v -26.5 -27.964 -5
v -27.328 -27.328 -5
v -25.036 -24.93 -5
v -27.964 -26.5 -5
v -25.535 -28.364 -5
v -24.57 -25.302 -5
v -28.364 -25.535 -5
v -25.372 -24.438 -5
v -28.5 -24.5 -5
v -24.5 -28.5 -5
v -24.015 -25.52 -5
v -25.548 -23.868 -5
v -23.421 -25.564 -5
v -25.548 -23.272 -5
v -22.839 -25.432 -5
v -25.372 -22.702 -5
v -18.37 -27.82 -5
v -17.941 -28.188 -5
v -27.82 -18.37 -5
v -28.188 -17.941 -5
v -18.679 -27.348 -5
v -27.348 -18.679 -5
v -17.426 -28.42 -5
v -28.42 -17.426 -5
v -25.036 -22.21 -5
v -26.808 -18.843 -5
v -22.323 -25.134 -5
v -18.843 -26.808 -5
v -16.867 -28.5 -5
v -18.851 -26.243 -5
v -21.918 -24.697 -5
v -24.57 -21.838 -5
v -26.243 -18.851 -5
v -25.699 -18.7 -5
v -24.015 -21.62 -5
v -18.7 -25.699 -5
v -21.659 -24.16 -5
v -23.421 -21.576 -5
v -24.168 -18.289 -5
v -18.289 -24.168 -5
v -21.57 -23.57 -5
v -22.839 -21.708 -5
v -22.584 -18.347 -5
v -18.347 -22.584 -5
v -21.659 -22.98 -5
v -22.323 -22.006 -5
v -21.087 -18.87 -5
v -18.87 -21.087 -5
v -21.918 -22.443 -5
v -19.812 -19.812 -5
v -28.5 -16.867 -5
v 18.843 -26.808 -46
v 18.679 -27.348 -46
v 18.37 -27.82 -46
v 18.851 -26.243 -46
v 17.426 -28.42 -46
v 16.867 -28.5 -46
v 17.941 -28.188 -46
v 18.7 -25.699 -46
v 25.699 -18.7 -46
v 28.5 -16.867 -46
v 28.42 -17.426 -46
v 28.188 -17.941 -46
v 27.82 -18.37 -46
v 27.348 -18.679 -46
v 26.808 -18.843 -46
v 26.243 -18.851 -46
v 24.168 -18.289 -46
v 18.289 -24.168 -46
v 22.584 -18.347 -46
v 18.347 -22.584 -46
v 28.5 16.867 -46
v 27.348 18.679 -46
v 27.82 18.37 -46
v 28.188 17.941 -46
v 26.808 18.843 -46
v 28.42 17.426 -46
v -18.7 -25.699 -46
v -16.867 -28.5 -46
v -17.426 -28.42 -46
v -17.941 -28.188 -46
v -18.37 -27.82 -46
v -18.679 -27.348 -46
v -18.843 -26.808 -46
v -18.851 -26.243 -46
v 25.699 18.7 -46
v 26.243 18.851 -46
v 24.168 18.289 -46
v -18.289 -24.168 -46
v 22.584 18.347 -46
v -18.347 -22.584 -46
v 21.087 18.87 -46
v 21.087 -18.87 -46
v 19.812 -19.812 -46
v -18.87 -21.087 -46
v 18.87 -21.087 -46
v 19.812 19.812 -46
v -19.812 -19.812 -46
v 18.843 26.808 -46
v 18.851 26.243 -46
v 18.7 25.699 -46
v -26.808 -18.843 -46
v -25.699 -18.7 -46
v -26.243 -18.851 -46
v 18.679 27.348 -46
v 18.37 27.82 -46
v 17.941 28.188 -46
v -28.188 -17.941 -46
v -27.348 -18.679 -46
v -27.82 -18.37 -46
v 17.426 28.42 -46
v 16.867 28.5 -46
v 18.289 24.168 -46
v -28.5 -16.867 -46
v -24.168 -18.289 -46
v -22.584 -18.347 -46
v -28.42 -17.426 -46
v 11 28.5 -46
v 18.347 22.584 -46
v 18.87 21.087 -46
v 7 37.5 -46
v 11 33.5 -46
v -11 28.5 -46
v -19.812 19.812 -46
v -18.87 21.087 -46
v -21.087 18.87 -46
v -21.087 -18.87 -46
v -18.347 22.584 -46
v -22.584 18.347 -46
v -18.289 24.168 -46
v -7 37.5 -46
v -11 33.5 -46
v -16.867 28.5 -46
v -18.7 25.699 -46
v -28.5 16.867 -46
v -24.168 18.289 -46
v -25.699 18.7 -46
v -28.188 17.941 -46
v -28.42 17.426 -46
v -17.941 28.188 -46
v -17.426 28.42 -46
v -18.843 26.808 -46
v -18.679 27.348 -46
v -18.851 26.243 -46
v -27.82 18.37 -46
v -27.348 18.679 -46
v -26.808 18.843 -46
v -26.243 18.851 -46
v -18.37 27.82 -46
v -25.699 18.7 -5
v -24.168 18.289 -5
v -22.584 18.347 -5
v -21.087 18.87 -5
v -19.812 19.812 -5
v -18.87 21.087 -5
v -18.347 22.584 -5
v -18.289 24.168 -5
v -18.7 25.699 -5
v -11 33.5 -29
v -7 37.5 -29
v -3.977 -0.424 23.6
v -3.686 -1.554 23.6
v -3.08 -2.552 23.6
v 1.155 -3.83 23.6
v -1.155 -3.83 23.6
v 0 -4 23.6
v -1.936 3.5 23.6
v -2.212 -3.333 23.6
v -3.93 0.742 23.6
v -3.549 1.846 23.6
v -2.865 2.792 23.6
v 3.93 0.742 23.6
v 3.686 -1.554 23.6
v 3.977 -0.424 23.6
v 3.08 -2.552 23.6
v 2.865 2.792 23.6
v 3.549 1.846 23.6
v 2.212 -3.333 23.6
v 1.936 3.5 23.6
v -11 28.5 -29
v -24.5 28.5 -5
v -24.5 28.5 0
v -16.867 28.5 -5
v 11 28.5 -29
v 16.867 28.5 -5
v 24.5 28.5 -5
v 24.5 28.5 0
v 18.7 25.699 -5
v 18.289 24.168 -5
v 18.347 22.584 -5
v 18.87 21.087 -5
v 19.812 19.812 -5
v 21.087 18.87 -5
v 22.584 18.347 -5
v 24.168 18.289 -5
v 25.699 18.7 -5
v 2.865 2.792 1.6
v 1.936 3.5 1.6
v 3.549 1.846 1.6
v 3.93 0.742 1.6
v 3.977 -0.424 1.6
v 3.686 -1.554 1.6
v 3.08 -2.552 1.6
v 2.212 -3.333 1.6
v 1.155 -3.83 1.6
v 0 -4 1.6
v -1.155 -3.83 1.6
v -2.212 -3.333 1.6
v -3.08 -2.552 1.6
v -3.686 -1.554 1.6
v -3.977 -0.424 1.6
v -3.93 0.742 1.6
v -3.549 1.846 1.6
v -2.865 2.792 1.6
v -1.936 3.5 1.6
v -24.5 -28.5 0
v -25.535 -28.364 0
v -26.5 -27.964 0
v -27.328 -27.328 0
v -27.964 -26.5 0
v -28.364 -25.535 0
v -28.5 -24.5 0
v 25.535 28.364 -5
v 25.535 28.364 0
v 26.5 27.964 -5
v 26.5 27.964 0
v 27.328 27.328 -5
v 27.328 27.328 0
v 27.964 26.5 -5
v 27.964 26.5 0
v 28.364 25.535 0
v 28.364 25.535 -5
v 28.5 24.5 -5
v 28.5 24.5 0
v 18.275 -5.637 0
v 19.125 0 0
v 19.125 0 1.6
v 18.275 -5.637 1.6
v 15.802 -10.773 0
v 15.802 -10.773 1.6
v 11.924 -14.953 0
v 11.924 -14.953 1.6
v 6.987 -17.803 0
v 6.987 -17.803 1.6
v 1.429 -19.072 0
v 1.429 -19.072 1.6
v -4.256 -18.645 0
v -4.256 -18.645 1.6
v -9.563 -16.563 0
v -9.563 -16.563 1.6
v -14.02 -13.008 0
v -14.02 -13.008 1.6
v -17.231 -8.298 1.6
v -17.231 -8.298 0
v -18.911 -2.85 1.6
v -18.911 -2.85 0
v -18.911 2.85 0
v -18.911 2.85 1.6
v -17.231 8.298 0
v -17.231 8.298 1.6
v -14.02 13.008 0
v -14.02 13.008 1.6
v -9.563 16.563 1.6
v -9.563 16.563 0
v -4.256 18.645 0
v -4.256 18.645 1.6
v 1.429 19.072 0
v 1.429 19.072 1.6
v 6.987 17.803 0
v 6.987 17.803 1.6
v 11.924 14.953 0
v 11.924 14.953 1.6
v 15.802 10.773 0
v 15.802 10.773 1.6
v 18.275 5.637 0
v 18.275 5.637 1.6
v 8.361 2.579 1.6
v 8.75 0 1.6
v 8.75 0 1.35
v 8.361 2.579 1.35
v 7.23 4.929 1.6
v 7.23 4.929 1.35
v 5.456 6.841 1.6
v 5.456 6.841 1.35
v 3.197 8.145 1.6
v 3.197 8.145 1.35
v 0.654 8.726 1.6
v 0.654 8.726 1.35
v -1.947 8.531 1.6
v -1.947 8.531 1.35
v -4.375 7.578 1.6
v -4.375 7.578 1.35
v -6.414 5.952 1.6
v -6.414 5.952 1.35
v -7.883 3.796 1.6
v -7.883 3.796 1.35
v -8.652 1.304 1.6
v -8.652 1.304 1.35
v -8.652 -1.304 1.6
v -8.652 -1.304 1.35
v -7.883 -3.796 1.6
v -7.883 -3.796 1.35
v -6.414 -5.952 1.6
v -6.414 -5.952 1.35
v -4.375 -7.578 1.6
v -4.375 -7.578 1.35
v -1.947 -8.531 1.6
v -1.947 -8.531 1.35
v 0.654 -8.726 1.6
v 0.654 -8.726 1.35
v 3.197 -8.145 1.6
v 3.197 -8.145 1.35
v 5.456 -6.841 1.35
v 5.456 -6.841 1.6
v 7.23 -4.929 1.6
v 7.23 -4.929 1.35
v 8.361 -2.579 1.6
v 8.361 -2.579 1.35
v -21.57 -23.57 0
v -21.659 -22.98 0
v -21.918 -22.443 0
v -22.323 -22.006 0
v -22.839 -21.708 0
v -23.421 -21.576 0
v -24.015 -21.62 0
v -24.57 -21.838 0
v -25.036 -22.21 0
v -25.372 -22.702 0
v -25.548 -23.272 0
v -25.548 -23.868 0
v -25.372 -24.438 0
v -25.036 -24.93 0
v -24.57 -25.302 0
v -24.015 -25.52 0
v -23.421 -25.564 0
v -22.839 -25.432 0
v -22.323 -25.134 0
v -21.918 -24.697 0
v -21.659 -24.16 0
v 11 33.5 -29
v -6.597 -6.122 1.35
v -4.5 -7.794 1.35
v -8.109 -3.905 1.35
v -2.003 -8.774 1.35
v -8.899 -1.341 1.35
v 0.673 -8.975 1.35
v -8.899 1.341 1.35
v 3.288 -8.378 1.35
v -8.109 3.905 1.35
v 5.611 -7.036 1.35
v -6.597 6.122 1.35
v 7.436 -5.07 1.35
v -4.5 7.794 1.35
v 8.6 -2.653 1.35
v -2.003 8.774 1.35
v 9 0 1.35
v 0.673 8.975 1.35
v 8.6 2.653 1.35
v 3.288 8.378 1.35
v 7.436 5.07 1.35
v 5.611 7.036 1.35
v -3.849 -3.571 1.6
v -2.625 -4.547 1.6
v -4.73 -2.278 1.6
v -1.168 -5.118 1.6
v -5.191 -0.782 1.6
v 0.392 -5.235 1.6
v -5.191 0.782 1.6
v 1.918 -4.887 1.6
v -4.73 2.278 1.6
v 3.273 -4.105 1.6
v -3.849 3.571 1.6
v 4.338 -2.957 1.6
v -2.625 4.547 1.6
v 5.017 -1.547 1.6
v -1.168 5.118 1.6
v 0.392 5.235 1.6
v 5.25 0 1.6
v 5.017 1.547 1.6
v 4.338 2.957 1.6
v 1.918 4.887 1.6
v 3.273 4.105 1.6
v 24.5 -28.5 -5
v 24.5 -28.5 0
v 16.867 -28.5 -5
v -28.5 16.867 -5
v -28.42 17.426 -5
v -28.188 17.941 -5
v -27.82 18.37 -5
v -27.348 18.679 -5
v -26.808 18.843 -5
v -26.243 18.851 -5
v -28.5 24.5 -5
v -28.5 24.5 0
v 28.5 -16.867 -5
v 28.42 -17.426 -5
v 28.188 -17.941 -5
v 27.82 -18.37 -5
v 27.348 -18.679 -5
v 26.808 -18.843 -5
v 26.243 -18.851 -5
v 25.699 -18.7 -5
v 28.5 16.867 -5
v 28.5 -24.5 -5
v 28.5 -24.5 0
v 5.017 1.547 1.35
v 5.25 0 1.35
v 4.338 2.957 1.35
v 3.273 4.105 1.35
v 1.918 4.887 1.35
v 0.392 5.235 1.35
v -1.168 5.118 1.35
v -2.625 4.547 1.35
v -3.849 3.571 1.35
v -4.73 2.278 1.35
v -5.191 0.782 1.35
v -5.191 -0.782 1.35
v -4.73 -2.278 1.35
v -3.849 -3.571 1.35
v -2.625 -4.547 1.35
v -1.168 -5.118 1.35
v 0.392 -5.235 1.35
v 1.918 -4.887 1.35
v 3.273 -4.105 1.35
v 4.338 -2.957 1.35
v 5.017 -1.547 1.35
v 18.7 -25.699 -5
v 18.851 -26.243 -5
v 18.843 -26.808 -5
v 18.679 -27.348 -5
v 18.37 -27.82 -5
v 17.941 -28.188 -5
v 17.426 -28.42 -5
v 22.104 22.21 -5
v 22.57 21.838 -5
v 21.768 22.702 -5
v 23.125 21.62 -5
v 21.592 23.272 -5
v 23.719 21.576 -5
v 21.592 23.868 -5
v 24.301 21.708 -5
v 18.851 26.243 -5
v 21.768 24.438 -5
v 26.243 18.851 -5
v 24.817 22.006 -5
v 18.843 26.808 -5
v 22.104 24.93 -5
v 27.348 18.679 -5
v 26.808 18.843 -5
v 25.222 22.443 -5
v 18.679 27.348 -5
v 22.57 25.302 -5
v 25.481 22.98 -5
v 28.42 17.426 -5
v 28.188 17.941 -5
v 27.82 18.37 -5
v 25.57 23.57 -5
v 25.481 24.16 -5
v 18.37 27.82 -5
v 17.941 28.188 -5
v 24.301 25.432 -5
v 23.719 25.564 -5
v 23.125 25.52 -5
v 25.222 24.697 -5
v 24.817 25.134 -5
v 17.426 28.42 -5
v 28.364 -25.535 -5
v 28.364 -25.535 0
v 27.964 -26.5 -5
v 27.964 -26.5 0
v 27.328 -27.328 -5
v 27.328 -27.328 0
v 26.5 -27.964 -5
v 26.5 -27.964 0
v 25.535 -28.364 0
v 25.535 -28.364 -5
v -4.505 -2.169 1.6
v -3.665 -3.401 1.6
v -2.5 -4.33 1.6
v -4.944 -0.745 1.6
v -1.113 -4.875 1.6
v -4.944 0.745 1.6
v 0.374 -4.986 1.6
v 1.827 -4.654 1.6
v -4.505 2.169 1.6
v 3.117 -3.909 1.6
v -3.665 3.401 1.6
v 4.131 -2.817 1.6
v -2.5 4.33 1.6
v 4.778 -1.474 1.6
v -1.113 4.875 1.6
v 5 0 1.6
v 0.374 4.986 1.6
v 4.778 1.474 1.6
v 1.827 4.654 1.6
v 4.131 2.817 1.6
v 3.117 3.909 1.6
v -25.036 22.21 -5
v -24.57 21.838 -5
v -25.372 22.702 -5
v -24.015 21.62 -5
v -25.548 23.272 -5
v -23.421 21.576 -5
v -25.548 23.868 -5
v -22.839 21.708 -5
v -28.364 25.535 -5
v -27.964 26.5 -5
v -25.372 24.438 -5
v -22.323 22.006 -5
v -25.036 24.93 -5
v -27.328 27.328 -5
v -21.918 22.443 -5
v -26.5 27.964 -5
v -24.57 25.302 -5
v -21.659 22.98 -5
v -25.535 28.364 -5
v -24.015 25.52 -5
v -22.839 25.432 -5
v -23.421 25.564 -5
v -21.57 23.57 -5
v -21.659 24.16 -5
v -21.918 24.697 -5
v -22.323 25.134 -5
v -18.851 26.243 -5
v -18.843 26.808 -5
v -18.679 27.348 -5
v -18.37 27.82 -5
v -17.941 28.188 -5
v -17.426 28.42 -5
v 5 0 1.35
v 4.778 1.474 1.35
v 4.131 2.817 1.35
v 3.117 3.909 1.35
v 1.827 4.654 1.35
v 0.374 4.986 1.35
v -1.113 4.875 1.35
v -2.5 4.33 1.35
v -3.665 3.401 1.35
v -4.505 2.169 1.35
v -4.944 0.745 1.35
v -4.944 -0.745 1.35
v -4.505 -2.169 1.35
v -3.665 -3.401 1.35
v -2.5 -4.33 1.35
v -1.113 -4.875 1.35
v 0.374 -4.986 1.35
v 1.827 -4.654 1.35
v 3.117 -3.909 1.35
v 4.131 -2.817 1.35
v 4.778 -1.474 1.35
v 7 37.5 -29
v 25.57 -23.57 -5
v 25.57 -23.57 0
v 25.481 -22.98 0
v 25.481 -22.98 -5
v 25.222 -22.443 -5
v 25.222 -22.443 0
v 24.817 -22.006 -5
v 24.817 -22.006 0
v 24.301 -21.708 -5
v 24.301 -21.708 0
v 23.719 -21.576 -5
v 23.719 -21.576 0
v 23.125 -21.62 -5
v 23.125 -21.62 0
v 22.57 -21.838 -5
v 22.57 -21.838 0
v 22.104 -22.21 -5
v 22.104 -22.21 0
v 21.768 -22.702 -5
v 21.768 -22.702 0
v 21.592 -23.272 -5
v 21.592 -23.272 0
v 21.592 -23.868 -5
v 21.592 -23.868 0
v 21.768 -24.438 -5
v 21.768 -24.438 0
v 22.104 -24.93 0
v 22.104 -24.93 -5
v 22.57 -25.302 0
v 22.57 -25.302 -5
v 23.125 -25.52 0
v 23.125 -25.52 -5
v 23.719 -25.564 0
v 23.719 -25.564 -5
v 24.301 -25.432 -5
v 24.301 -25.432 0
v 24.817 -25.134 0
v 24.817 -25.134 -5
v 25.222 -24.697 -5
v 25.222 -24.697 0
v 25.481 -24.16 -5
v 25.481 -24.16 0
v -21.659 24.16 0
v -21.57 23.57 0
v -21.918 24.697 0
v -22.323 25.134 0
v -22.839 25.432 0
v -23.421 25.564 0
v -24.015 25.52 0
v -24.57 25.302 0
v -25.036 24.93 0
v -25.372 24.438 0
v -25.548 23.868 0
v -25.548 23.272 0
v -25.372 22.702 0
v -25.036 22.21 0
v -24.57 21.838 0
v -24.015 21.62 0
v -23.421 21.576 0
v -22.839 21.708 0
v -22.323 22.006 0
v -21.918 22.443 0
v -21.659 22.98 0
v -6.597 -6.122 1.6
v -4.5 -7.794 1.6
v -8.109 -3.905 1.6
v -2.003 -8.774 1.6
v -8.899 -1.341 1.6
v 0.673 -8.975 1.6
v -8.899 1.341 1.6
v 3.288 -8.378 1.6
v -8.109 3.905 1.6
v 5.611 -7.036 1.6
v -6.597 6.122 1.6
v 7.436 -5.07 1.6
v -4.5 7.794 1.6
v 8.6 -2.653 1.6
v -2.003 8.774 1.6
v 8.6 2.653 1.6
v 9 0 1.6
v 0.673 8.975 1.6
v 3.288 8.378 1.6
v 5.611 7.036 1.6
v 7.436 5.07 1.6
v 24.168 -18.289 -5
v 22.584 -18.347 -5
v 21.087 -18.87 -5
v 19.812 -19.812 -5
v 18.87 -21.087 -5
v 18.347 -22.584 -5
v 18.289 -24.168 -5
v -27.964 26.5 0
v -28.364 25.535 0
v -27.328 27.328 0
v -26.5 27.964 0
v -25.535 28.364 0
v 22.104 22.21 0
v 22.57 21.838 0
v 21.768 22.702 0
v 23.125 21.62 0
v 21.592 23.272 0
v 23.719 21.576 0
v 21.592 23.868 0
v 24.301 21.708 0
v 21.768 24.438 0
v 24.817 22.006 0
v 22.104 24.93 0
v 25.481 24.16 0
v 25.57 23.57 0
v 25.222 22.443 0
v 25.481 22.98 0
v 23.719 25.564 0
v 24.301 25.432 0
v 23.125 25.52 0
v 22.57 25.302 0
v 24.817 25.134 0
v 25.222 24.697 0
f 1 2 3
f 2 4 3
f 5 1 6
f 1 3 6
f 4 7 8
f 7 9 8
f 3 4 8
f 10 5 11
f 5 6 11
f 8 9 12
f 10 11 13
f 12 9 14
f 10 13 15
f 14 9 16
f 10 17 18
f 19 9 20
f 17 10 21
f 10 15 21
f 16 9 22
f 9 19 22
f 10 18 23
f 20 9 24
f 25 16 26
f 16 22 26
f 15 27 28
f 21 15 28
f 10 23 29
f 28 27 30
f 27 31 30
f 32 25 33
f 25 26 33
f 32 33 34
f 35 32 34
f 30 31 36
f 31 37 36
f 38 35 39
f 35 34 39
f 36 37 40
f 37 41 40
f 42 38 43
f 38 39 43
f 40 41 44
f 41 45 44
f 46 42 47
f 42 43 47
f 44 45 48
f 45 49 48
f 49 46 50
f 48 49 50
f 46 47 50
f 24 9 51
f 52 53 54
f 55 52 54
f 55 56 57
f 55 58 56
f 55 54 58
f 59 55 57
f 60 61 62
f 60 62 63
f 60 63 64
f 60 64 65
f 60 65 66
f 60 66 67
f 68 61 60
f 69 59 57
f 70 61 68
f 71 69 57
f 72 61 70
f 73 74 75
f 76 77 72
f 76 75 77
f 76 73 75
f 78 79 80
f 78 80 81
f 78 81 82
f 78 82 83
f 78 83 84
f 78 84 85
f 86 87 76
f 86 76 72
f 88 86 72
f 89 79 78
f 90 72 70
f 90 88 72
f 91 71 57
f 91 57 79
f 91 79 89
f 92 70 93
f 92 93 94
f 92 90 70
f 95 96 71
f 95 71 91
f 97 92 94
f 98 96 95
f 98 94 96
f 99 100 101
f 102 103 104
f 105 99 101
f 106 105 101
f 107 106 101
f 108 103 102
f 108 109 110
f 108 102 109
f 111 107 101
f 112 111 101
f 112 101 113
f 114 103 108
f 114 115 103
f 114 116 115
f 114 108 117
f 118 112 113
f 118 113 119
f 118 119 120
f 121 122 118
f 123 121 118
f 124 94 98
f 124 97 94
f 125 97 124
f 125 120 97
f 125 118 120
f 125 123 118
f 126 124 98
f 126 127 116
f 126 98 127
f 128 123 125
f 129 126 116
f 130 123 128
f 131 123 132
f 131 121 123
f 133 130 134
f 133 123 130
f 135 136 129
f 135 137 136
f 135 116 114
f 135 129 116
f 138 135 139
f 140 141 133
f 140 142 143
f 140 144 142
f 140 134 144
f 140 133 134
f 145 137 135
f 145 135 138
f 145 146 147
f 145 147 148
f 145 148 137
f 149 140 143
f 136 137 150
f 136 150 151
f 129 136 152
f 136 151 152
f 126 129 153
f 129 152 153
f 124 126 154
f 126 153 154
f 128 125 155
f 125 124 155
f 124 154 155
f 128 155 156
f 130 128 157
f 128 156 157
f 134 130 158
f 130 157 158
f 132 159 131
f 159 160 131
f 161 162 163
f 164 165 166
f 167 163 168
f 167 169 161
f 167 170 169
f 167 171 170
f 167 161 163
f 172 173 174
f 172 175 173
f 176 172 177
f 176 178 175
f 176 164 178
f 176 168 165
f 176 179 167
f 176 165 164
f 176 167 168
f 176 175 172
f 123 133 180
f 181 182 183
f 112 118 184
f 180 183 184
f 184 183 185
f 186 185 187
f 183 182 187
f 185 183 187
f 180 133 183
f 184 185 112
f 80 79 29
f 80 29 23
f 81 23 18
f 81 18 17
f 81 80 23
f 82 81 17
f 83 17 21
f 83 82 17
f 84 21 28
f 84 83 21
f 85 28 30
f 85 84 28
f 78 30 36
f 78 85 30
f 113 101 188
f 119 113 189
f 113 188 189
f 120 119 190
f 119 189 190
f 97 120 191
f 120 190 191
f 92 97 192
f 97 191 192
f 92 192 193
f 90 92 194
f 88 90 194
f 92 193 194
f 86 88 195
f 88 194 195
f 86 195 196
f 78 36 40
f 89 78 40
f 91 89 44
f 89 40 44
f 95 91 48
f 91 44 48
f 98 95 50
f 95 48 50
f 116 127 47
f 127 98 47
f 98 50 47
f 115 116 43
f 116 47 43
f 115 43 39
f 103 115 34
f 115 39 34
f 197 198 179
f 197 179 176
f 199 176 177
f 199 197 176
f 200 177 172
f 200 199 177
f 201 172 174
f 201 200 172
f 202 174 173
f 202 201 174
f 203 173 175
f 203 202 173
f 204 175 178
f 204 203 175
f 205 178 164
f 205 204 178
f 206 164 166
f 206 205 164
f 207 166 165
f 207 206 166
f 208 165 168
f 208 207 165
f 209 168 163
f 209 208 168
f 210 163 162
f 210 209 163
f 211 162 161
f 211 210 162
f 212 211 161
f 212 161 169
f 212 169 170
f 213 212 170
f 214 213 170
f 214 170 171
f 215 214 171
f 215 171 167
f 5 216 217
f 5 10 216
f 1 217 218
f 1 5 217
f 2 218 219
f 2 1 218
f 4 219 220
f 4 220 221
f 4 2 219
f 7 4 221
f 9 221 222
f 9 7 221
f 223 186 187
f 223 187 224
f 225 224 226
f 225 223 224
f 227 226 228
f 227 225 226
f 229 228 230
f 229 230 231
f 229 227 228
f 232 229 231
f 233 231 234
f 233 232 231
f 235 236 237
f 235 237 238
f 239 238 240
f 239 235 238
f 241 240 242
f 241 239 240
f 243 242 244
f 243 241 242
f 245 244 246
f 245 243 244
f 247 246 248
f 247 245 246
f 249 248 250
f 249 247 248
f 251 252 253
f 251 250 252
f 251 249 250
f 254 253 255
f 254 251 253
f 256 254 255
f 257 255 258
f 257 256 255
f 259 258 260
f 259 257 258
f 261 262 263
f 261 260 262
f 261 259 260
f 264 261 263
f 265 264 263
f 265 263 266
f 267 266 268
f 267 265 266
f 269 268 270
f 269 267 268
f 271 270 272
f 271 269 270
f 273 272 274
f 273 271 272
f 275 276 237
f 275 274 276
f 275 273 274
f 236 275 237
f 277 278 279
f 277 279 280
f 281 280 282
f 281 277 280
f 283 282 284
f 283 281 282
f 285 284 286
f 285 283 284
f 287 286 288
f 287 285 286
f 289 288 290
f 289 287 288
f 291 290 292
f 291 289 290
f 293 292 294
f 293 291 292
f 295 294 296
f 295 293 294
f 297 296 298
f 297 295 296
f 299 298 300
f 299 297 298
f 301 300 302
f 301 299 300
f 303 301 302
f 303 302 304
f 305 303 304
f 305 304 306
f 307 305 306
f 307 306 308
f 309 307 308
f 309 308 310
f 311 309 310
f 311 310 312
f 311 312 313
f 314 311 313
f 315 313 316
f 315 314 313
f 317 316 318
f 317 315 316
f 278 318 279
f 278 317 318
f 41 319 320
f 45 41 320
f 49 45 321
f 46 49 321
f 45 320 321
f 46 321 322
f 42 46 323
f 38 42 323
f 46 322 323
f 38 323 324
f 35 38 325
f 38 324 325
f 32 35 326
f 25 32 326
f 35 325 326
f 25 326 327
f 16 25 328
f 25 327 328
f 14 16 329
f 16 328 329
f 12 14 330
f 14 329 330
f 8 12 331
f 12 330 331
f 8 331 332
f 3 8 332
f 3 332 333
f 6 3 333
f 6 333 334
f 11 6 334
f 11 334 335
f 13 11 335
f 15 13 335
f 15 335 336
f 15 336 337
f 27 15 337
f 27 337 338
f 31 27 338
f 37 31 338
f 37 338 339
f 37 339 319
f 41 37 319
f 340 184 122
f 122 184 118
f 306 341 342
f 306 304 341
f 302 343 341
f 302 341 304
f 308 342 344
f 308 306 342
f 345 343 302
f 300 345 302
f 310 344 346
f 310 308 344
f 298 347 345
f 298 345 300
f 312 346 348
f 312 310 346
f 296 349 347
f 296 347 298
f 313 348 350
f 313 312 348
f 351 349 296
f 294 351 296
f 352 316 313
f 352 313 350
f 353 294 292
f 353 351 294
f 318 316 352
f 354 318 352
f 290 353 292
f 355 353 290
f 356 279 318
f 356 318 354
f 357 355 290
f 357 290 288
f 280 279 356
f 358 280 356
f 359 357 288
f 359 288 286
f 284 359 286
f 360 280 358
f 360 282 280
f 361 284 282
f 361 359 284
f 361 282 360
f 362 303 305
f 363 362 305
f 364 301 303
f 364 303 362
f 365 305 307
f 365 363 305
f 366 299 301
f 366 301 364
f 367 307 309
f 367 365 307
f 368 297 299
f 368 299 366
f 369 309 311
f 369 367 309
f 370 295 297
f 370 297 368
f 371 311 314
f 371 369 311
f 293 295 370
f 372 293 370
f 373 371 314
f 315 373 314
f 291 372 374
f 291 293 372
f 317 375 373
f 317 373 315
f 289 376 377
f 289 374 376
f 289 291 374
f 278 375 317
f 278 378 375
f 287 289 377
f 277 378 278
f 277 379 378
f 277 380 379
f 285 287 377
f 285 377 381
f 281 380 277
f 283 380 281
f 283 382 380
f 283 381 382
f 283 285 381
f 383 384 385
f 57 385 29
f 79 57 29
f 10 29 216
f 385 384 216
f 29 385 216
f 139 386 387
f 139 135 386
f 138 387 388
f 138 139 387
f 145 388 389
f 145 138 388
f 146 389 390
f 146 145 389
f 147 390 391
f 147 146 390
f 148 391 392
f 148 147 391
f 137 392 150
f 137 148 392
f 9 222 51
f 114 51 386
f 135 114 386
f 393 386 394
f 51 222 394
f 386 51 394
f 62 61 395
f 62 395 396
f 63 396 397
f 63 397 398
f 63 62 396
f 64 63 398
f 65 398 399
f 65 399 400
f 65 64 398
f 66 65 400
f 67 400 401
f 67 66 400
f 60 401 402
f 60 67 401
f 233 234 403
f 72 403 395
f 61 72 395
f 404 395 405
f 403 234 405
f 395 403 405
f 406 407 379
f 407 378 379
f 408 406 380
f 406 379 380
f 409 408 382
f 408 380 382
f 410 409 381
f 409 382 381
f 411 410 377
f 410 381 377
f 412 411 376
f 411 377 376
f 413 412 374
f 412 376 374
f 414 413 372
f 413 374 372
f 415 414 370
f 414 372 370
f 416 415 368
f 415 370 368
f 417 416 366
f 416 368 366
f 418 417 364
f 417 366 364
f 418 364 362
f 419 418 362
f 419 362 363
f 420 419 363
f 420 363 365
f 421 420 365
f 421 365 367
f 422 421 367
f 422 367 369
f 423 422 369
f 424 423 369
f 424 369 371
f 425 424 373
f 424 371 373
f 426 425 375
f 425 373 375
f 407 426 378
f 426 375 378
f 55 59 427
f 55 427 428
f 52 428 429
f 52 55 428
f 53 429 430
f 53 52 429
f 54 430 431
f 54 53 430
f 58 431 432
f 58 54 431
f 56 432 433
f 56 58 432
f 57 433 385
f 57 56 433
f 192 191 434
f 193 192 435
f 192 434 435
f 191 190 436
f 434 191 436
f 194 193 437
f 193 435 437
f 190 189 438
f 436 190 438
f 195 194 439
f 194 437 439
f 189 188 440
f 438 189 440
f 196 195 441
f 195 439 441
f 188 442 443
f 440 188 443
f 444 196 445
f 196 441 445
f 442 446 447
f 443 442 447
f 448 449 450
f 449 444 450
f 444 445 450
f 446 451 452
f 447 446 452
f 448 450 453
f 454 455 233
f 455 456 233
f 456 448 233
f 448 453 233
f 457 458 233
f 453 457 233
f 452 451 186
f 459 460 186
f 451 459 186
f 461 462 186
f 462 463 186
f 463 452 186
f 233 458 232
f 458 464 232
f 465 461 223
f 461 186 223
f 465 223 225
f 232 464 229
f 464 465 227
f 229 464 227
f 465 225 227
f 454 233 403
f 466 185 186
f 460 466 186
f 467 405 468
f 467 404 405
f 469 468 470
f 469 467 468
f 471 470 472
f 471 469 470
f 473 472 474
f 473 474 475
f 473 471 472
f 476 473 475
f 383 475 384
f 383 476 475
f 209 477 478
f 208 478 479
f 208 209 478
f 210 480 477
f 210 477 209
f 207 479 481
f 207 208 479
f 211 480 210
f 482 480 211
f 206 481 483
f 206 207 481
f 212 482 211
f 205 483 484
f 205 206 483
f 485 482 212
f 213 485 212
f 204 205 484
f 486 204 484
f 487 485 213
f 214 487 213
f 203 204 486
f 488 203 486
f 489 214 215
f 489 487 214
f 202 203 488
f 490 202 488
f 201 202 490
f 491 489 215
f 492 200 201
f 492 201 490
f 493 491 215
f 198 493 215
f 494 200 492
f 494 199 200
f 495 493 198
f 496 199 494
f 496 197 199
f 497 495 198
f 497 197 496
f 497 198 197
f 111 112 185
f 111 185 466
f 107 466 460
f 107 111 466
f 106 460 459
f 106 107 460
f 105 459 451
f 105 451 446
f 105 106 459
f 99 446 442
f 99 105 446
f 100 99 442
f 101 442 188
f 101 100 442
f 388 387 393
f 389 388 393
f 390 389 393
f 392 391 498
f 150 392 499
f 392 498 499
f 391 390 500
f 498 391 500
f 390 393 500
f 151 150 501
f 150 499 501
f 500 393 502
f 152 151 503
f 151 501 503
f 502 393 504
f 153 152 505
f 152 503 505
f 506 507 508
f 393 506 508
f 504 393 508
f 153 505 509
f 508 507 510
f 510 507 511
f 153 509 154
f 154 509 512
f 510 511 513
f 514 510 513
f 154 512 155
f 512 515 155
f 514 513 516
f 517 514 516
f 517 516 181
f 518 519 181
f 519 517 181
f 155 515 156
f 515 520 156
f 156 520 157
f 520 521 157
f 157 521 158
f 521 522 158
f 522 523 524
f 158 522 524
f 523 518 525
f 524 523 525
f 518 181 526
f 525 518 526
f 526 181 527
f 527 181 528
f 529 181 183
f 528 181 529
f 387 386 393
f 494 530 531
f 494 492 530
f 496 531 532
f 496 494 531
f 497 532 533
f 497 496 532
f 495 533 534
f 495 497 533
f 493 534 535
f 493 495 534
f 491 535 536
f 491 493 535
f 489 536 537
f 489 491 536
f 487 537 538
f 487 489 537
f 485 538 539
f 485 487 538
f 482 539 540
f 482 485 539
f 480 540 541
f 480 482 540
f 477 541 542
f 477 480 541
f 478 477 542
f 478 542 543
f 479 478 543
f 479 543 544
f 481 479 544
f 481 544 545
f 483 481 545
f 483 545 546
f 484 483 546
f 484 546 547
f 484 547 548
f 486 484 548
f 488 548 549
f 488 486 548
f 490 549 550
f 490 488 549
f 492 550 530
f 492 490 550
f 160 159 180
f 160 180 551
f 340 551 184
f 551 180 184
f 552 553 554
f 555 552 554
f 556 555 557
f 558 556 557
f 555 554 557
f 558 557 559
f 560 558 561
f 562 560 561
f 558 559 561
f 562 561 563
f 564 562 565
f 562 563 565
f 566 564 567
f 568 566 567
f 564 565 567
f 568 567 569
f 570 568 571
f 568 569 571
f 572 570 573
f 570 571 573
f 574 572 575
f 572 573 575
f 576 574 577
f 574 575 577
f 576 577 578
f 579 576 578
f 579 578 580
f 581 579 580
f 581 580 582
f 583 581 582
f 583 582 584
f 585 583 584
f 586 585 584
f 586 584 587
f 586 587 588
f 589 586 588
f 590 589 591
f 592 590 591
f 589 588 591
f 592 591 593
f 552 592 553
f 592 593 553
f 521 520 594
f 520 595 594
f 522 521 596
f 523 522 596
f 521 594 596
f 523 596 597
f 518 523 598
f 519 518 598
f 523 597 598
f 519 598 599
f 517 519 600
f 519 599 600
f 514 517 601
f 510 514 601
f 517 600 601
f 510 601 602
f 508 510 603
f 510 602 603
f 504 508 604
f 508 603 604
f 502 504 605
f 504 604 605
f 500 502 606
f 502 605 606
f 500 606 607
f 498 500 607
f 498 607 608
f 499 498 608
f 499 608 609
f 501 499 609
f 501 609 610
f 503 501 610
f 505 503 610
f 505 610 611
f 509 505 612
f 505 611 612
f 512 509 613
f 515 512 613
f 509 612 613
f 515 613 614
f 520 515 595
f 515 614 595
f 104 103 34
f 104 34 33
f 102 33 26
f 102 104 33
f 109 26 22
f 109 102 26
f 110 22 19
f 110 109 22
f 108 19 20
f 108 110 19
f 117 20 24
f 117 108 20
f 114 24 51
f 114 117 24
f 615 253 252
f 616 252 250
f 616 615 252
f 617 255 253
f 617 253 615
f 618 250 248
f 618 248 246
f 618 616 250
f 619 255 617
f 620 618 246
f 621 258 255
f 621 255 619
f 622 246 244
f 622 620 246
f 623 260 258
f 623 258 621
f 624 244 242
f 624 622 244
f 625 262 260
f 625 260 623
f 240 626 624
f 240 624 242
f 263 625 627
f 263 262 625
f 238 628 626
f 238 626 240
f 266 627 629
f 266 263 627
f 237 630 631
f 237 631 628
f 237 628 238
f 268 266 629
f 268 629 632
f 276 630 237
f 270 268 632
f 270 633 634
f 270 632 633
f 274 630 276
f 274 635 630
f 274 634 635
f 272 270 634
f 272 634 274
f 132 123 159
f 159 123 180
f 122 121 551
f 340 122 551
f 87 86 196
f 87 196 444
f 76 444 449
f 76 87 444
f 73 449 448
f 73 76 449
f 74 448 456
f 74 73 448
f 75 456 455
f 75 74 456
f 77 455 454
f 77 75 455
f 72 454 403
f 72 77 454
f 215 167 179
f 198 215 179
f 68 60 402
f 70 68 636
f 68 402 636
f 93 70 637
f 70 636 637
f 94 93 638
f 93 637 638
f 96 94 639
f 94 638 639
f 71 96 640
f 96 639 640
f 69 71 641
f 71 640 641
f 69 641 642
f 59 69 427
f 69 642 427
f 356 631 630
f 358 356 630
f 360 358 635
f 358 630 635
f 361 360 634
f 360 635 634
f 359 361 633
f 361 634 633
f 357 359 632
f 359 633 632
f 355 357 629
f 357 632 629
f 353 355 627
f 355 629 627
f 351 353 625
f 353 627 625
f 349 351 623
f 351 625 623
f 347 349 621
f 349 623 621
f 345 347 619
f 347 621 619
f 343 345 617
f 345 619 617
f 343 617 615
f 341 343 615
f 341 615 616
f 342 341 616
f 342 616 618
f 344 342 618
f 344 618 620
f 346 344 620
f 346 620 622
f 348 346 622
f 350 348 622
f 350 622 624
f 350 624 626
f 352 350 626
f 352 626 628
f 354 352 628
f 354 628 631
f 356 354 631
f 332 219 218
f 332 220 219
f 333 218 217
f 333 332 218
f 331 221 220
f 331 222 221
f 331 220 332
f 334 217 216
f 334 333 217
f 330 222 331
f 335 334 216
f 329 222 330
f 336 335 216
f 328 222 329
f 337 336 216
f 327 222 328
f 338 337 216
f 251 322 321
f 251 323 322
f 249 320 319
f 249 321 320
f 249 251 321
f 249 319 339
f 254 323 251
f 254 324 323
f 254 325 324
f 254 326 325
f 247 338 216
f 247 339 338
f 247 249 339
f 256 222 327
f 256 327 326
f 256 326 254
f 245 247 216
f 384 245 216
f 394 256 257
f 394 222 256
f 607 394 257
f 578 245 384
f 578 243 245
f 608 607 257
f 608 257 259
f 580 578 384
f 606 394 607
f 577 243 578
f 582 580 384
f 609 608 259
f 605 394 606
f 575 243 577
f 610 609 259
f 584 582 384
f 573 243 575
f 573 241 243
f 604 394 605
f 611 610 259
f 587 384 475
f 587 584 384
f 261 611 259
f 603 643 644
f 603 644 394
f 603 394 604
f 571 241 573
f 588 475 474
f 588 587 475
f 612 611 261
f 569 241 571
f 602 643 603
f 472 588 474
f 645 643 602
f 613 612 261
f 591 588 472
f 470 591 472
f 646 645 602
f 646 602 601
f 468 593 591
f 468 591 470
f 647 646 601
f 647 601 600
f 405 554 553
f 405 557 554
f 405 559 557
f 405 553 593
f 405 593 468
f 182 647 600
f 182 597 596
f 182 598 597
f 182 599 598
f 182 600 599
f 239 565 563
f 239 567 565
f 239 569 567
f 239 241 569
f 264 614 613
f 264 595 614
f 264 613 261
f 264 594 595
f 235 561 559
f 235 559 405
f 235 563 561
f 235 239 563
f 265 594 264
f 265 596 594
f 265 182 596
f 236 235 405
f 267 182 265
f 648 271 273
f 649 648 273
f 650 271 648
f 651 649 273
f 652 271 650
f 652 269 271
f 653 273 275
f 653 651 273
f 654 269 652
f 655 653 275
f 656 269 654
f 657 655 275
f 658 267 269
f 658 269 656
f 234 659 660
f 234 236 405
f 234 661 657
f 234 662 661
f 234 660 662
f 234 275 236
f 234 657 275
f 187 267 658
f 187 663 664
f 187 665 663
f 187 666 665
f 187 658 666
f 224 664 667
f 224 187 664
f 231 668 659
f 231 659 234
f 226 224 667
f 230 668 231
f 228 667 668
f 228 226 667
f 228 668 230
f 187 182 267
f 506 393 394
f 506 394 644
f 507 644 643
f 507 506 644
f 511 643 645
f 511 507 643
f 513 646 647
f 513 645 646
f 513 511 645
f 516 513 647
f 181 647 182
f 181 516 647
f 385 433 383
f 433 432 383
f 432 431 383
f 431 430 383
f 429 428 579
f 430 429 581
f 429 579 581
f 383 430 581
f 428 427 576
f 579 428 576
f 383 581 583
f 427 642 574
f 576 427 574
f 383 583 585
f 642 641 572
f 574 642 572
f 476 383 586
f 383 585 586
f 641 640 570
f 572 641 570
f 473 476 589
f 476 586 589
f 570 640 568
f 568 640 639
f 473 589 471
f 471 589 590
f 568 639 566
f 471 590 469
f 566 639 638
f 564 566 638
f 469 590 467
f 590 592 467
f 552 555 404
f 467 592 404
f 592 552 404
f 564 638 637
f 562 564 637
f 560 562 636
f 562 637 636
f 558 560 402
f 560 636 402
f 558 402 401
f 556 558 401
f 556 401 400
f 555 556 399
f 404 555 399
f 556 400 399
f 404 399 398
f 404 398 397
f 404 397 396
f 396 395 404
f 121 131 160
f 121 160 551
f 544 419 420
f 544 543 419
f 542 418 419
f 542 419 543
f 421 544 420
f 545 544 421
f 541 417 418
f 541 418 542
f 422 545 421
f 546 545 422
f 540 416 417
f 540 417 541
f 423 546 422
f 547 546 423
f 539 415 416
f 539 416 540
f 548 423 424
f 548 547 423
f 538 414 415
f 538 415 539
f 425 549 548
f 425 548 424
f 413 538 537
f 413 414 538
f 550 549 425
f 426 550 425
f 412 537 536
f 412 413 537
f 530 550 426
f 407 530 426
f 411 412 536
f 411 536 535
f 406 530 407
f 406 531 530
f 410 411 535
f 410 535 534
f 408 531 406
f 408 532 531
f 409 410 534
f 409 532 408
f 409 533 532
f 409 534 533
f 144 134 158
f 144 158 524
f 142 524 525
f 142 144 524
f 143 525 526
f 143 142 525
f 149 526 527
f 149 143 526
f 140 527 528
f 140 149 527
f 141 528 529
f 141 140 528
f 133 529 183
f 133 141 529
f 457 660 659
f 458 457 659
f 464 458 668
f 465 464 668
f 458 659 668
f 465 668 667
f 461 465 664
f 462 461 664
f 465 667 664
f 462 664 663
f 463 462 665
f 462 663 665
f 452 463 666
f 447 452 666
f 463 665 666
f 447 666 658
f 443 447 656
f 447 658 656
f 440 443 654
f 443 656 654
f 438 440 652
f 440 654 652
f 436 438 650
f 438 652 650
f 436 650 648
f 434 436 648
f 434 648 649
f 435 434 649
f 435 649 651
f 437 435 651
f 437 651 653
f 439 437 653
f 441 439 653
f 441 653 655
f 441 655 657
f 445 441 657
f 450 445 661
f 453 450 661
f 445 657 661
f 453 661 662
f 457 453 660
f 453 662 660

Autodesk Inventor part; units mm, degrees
ref_plane "YZ Plane" through (0, 0, 0) normal (1, 0, 0) x (0, 1, 0)
sketch "Sketch1" plane through (0, 0, 0) normal (0, 0, 1) x (1, 0, 0)
  line L0 (-28.5, 28.5) -> (28.5, 28.5)
  line L1 (28.5, 28.5) -> (28.5, -28.5)
  line L2 (28.5, -28.5) -> (-28.5, -28.5)
  line L3 (-28.5, -28.5) -> (-28.5, 28.5)
  line L4 (-28.5, 28.5) -> (28.5, -28.5) construction
  line L5 (28.5, 28.5) -> (-28.5, -28.5) construction
  line L6 (-23.57, 23.57) -> (23.57, 23.57) construction
  circle A0 centre (-23.57, 23.57) radius 2
  line L7 (0, 0) -> (0, 28.5) construction
  line L8 (-28.5, 0) -> (28.5, 0) construction
  circle A1 centre (23.57, 23.57) radius 2
  circle A2 centre (-23.57, -23.57) radius 2
  circle A3 centre (23.57, -23.57) radius 2
  dimension "d0" = 57
  dimension "d1" = 47.14
  dimension "d2" = 4
extrude "Extrusion1" add sketch "Sketch1" against normal blind 5
fillet "Fillet1" radius 4 4 edges at (28.5, -28.5, -2.5) (28.5, 28.5, -2.5) (-28.5, 28.5, -2.5) (-28.5, -28.5, -2.5)
sketch "Sketch2" plane through (0, 0, 0) normal (0, 0, 1) x (1, 0, 0)
  circle A0 centre (0, 0) radius 19.125
  dimension "d6" = 38.25
extrude "Extrusion2" add sketch "Sketch2" along normal blind 1.6
sketch "Sketch3" plane through (0, 0, 1.6) normal (0, 0, 1) x (1, 0, 0)
  circle A0 centre (0, 0) radius 9
  circle A1 centre (0, 0) radius 5
  circle A2 centre (0, 0) radius 8.75
  circle A3 centre (0, 0) radius 5.25
  dimension "d9" = 18
  dimension "d10" = 4
  dimension "d11" = 0.25
  dimension "d12" = 0.25
extrude "Extrusion3" cut sketch "Sketch3" against normal blind 0.25
sketch "Sketch4" plane through (0, 0, 1.6) normal (0, 0, 1) x (1, 0, 0)
  circle A0 centre (0, 0) radius 4
  dimension "d15" = 8
extrude "Extrusion4" add sketch "Sketch4" along normal blind 22
sketch "Sketch5" plane through (0, 0, 23.6) normal (0, 0, 1) x (1, 0, 0)
  circle A0 centre (0, 0) radius 4 projected
  line L0 (-1.9365, 3.5) -> (1.9365, 3.5)
  line L1 (0, -4) -> (0, 3.5) construction
  dimension "d18" = 7.5
extrude "Extrusion5" cut sketch "Sketch5" against normal up to surface (22 mm away) contours L0 A0 picked at (-0.3981, 3.6058)
sketch "Sketch6" plane through (0, 0, -5) normal (0, 0, -1) x (-1, 0, 0)
  arc A0 (24.5, -28.5) -> (28.5, -24.5) centre (24.5, -24.5) ccw projected
  line L0 (28.5, -24.5) -> (28.5, 24.5) projected
  arc A1 (28.5, 24.5) -> (24.5, 28.5) centre (24.5, 24.5) ccw projected
  line L1 (24.5, 28.5) -> (-24.5, 28.5) projected
  arc A2 (-24.5, 28.5) -> (-28.5, 24.5) centre (-24.5, 24.5) ccw projected
  line L2 (-28.5, 24.5) -> (-28.5, -24.5) projected
  arc A3 (-28.5, -24.5) -> (-24.5, -28.5) centre (-24.5, -24.5) ccw projected
  line L3 (-24.5, -28.5) -> (24.5, -28.5) projected
  circle A4 centre (-23.57, -23.57) radius 2 projected
  circle A5 centre (23.57, -23.57) radius 2 projected
  circle A6 centre (-23.57, 23.57) radius 2 projected
  circle A7 centre (23.57, 23.57) radius 2 projected
  circle A8 centre (23.57, 23.57) radius 5.3152
  line L4 (0, 28.5) -> (0, -28.5)
  line L5 (28.5, 0) -> (-28.5, 0)
  circle A9 centre (23.57, -23.57) radius 5.3152
  circle A10 centre (-23.57, 23.57) radius 5.3152
  circle A11 centre (-23.57, -23.57) radius 5.3152
  point P0 (0, 0)
  point P1 (28.5, 21.5834)
  point P2 (21.5834, 28.5)
  point P3 (-21.5834, 28.5)
  point P4 (-28.5, 21.5834)
  point P5 (-28.5, -21.5834)
  point P6 (-21.5834, -28.5)
  point P7 (21.5834, -28.5)
  point P8 (28.5, -21.5834)
extrude "Extrusion6" add sketch "Sketch6" along normal blind 41 contours L3 L4 L5 L0 A9 | L3 A11 L2 L5 L4 | L5 L2 A10 L1 L4 | L4 L1 A8 L0 L5
fillet "Fillet2" radius 2 8 edges at (-28.5, 21.5834, -25.5) (-21.5834, 28.5, -25.5) (-28.5, -21.5834, -25.5) (-21.5834, -28.5, -25.5) (21.5834, 28.5, -25.5) (28.5, 21.5834, -25.5) (28.5, -21.5834, -25.5) (21.5834, -28.5, -25.5)
sketch "Sketch8" plane through (-24.5, 28.5, 0) normal (0, 1, 0) x (1, 0, 0)
  line L0 (41.3672, 46) -> (7.6328, 46) projected
  line L1 (35.5, 46) -> (13.5, 46)
  line L2 (13.5, 46) -> (13.5, 29)
  line L3 (13.5, 29) -> (35.5, 29)
  line L4 (35.5, 29) -> (35.5, 46)
  line L5 (24.5, 0) -> (24.5, 46) construction
  point P0 (24.5, 29)
  point P1 (13.5, 46)
  dimension "d24" = 22
  dimension "d25" = 17
extrude "Extrusion7" add sketch "Sketch8" along normal blind 9
chamfer "Chamfer1" distance 4 angle 45 2 edges at (11, 37.5, -37.5) (-11, 37.5, -37.5)
sketch "DiagonalProfile" plane through (0, 0, 0) normal (0, 0, 1) x (1, 0, 0)
  circle A0 centre (-23.57, -23.57) radius 2 projected
  circle A1 centre (23.57, 23.57) radius 2 projected
  line L0 (-23.57, -23.57) -> (23.57, 23.57)
  circle A2 centre (23.57, -23.57) radius 2 projected
  circle A3 centre (-23.57, 23.57) radius 2 projected
  line L1 (23.57, -23.57) -> (-23.57, 23.57)
  point P0 (0, 0)
ref_plane "DiagonalPlane1" through (23.57, -23.57, 0) normal (0.7071, 0.7071, 0) x (-0.7071, 0.7071, 0)
ref_plane "DiagonalPlane2" through (-23.57, -23.57, 0) normal (0.7071, -0.7071, 0) x (0.7071, 0.7071, 0)
properties part number "SouluckNema23-0.7N-24V"
